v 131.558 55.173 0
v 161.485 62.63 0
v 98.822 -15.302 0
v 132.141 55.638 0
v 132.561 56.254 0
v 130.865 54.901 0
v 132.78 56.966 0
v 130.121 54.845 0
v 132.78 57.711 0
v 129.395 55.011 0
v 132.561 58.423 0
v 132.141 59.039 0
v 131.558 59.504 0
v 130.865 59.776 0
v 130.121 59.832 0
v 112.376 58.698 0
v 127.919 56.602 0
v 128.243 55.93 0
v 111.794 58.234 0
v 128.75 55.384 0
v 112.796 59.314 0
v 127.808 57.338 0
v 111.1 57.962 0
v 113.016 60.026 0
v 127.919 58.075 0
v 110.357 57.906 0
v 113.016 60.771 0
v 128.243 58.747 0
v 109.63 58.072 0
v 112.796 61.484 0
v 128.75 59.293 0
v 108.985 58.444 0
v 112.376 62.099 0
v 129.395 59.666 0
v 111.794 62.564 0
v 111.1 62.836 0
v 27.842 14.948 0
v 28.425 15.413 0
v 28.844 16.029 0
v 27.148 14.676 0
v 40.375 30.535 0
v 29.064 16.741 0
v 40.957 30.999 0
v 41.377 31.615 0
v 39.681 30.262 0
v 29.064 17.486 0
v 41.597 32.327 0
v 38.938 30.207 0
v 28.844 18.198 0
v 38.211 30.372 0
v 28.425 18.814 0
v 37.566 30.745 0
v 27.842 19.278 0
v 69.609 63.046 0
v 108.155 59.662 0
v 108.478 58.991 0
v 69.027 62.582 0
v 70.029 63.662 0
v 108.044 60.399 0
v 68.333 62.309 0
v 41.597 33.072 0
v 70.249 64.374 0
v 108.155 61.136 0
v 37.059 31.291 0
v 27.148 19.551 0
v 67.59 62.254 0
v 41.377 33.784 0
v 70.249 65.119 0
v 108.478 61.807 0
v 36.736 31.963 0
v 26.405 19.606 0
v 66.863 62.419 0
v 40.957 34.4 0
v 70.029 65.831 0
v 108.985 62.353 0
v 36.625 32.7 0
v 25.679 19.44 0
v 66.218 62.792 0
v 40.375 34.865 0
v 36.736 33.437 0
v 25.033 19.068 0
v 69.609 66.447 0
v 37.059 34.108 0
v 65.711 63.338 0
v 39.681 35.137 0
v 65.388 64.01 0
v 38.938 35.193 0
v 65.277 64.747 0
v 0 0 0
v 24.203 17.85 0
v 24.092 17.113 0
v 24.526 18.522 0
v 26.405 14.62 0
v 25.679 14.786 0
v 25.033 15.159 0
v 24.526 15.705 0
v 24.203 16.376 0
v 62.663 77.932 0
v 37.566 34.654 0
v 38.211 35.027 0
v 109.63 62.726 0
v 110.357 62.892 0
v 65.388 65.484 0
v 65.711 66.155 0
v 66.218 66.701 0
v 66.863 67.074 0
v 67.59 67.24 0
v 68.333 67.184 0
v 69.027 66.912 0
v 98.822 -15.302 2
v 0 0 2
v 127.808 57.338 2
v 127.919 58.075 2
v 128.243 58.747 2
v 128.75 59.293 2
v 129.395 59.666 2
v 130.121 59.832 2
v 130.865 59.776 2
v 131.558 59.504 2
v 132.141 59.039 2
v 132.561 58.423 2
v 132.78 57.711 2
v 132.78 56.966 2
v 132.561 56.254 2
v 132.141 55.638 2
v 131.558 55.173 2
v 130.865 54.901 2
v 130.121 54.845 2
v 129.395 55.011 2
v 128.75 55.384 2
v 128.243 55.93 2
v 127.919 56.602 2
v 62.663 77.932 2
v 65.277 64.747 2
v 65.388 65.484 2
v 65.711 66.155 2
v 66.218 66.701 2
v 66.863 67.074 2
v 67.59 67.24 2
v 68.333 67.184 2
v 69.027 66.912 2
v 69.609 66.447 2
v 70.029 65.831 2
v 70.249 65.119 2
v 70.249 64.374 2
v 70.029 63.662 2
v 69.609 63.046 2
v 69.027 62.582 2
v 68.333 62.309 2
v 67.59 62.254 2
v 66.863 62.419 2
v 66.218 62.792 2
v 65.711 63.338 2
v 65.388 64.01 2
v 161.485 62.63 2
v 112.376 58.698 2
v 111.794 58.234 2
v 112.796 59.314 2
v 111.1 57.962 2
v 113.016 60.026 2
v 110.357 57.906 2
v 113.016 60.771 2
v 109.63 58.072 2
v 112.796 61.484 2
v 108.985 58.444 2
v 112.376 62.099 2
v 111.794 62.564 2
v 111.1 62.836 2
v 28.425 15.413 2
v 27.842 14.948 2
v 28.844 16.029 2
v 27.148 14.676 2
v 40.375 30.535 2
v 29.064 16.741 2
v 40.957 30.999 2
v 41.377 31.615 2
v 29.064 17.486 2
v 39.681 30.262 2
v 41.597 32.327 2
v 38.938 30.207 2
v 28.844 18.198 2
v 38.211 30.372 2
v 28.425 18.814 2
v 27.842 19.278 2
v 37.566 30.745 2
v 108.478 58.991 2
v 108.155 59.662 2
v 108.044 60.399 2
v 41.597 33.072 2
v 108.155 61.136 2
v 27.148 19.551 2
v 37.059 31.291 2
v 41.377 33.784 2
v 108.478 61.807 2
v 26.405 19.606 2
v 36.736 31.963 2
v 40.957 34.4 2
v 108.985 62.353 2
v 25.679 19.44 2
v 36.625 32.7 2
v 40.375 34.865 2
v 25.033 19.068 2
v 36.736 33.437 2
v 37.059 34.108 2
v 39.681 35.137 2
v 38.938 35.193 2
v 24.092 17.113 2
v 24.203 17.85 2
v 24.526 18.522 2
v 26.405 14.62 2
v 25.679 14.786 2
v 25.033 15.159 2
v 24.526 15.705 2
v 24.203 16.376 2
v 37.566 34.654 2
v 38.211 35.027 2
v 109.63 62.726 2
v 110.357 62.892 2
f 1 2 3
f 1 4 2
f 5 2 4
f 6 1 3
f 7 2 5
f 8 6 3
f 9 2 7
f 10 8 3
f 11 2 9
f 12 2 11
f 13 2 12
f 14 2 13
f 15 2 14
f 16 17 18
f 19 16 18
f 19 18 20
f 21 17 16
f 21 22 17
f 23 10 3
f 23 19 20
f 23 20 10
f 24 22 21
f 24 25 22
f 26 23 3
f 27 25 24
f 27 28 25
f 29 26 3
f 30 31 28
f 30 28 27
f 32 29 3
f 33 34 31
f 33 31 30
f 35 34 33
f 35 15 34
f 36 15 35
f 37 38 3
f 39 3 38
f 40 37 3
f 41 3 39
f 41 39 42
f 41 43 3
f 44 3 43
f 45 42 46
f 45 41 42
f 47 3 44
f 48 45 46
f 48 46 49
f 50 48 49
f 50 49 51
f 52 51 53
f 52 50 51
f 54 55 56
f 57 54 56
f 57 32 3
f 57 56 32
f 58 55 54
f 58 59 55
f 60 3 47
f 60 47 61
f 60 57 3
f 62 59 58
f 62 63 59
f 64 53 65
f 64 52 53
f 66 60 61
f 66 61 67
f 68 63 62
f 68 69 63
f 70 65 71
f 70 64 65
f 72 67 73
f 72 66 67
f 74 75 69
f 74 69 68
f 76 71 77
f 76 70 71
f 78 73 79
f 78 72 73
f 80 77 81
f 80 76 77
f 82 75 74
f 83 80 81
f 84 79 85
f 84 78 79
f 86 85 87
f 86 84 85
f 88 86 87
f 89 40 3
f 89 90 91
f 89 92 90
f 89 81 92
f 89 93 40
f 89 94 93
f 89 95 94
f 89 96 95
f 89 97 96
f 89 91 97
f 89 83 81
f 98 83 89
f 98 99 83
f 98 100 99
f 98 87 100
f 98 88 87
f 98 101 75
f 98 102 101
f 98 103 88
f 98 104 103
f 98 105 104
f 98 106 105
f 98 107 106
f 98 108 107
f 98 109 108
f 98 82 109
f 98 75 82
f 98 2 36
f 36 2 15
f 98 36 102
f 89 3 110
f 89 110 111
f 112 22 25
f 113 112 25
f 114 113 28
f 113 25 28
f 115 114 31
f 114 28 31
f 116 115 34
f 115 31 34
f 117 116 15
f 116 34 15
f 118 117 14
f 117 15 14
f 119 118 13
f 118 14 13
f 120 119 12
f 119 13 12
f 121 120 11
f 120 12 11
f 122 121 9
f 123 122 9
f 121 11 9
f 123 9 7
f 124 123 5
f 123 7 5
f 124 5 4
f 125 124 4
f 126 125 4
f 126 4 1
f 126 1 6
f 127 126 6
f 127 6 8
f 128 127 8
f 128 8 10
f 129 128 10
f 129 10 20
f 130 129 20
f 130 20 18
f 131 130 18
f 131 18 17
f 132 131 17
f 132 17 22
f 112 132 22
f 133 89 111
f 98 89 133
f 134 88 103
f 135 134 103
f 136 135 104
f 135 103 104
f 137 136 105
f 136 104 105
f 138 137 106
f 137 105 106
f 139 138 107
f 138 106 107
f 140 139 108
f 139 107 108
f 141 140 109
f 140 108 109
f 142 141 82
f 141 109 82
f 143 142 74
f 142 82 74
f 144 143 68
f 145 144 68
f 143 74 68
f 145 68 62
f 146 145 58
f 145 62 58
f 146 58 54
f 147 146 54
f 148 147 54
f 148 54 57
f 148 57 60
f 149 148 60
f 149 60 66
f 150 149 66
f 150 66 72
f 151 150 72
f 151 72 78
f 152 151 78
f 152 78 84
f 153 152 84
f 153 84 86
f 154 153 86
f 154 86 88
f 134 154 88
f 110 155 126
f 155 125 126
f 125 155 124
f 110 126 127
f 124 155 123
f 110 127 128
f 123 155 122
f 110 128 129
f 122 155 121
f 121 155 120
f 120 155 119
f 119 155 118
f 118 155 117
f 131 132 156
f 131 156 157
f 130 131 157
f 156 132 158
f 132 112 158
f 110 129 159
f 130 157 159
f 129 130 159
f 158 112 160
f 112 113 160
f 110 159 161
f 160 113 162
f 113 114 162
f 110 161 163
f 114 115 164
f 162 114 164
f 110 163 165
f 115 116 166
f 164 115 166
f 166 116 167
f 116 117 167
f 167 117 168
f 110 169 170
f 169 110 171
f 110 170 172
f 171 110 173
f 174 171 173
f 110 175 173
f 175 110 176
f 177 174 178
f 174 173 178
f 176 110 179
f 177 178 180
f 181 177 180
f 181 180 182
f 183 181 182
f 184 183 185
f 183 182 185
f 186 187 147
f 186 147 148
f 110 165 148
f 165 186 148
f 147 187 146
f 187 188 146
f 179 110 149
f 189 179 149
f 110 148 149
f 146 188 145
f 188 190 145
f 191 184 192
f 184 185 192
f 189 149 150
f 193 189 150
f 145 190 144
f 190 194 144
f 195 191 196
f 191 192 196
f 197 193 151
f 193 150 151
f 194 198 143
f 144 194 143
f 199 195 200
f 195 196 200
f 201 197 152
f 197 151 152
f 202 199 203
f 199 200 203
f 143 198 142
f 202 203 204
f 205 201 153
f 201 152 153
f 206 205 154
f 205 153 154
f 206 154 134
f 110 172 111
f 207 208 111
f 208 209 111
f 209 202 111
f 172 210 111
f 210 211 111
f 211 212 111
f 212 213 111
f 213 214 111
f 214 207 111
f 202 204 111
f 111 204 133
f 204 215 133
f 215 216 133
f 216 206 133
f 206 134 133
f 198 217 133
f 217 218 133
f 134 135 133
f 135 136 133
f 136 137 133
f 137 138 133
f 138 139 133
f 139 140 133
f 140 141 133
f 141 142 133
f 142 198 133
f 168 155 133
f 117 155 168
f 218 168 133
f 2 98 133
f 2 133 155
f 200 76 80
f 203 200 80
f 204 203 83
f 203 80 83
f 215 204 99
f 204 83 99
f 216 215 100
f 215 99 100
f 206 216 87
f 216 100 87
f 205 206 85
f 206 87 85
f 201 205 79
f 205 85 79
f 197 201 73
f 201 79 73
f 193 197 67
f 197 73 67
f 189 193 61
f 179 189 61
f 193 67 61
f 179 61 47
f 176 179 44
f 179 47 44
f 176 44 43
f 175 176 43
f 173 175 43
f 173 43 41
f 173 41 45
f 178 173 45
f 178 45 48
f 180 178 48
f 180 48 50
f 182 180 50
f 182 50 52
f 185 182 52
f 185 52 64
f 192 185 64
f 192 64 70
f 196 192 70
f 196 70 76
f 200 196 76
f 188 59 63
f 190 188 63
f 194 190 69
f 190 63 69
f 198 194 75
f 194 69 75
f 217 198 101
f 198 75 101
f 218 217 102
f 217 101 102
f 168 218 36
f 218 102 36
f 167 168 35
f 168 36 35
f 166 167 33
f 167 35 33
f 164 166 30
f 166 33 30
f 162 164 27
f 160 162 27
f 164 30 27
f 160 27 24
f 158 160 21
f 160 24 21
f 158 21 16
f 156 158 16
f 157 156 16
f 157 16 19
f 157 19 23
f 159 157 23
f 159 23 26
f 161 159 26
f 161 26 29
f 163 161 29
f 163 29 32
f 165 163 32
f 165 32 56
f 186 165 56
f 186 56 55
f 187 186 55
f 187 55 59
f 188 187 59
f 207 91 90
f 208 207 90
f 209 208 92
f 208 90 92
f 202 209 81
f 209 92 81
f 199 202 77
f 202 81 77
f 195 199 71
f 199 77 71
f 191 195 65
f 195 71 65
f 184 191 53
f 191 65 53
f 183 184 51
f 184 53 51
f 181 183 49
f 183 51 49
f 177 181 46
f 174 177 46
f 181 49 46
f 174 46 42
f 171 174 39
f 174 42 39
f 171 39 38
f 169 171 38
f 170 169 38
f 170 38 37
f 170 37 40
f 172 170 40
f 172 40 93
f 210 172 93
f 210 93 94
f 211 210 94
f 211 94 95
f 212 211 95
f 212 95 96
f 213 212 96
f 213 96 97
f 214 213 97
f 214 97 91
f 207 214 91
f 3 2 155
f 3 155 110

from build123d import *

# Parameters (mm, degrees)
BOSS_EXTRUDE1_DEPTH = 2
SKETCH2_R           = 2.5
CUT_EXTRUDE1_DEPTH  = 6
SKETCH3_R           = 2.5
CUT_EXTRUDE2_DEPTH  = 6
SKETCH4_R           = 2.5
CUT_EXTRUDE3_DEPTH  = 6
SKETCH5_R           = 2.5
CUT_EXTRUDE4_DEPTH  = 6
SKETCH6_R           = 2.5
CUT_EXTRUDE5_DEPTH  = 6


with BuildPart() as part:
    # Sketch1 → Boss-Extrude1 (new body)
    with BuildSketch(Plane.XY):
        Polygon((0, 0), (62.662776372, 77.931870614), (161.485144274, 62.630249712), (98.822367902, -15.301620902), align=None)
    extrude(amount=BOSS_EXTRUDE1_DEPTH)

    # Sketch2 → Cut-Extrude1 (cut)
    with BuildSketch(Plane(origin=(0, 0, 0), x_dir=(-1, 0, 0), z_dir=(0, 0, -1))):
        with Locations((-39.124575247, 32.69965767)):
            Circle(SKETCH2_R)
    extrude(amount=-CUT_EXTRUDE1_DEPTH, mode=Mode.SUBTRACT)

    # Sketch3 → Cut-Extrude2 (cut)
    with BuildSketch(Plane(origin=(0, 0, 0), x_dir=(-1, 0, 0), z_dir=(0, 0, -1))):
        with Locations((-26.592019973, 17.113283547)):
            Circle(SKETCH3_R)
    extrude(amount=-CUT_EXTRUDE2_DEPTH, mode=Mode.SUBTRACT)

    # Sketch4 → Cut-Extrude3 (cut)
    with BuildSketch(Plane(origin=(0, 0, 0), x_dir=(-1, 0, 0), z_dir=(0, 0, -1))):
        with Locations((-130.308271813, 57.338499192)):
            Circle(SKETCH4_R)
    extrude(amount=-CUT_EXTRUDE3_DEPTH, mode=Mode.SUBTRACT)

    # Sketch5 → Cut-Extrude4 (cut)
    with BuildSketch(Plane(origin=(0, 0, 0), x_dir=(-1, 0, 0), z_dir=(0, 0, -1))):
        with Locations((-110.543798232, 60.398823373)):
            Circle(SKETCH5_R)
    extrude(amount=-CUT_EXTRUDE4_DEPTH, mode=Mode.SUBTRACT)

    # Sketch6 → Cut-Extrude5 (cut)
    with BuildSketch(Plane(origin=(0, 0, 0), x_dir=(-1, 0, 0), z_dir=(0, 0, -1))):
        with Locations((-67.776514838, 64.746663819)):
            Circle(SKETCH6_R)
    extrude(amount=-CUT_EXTRUDE5_DEPTH, mode=Mode.SUBTRACT)


solid = part.part
